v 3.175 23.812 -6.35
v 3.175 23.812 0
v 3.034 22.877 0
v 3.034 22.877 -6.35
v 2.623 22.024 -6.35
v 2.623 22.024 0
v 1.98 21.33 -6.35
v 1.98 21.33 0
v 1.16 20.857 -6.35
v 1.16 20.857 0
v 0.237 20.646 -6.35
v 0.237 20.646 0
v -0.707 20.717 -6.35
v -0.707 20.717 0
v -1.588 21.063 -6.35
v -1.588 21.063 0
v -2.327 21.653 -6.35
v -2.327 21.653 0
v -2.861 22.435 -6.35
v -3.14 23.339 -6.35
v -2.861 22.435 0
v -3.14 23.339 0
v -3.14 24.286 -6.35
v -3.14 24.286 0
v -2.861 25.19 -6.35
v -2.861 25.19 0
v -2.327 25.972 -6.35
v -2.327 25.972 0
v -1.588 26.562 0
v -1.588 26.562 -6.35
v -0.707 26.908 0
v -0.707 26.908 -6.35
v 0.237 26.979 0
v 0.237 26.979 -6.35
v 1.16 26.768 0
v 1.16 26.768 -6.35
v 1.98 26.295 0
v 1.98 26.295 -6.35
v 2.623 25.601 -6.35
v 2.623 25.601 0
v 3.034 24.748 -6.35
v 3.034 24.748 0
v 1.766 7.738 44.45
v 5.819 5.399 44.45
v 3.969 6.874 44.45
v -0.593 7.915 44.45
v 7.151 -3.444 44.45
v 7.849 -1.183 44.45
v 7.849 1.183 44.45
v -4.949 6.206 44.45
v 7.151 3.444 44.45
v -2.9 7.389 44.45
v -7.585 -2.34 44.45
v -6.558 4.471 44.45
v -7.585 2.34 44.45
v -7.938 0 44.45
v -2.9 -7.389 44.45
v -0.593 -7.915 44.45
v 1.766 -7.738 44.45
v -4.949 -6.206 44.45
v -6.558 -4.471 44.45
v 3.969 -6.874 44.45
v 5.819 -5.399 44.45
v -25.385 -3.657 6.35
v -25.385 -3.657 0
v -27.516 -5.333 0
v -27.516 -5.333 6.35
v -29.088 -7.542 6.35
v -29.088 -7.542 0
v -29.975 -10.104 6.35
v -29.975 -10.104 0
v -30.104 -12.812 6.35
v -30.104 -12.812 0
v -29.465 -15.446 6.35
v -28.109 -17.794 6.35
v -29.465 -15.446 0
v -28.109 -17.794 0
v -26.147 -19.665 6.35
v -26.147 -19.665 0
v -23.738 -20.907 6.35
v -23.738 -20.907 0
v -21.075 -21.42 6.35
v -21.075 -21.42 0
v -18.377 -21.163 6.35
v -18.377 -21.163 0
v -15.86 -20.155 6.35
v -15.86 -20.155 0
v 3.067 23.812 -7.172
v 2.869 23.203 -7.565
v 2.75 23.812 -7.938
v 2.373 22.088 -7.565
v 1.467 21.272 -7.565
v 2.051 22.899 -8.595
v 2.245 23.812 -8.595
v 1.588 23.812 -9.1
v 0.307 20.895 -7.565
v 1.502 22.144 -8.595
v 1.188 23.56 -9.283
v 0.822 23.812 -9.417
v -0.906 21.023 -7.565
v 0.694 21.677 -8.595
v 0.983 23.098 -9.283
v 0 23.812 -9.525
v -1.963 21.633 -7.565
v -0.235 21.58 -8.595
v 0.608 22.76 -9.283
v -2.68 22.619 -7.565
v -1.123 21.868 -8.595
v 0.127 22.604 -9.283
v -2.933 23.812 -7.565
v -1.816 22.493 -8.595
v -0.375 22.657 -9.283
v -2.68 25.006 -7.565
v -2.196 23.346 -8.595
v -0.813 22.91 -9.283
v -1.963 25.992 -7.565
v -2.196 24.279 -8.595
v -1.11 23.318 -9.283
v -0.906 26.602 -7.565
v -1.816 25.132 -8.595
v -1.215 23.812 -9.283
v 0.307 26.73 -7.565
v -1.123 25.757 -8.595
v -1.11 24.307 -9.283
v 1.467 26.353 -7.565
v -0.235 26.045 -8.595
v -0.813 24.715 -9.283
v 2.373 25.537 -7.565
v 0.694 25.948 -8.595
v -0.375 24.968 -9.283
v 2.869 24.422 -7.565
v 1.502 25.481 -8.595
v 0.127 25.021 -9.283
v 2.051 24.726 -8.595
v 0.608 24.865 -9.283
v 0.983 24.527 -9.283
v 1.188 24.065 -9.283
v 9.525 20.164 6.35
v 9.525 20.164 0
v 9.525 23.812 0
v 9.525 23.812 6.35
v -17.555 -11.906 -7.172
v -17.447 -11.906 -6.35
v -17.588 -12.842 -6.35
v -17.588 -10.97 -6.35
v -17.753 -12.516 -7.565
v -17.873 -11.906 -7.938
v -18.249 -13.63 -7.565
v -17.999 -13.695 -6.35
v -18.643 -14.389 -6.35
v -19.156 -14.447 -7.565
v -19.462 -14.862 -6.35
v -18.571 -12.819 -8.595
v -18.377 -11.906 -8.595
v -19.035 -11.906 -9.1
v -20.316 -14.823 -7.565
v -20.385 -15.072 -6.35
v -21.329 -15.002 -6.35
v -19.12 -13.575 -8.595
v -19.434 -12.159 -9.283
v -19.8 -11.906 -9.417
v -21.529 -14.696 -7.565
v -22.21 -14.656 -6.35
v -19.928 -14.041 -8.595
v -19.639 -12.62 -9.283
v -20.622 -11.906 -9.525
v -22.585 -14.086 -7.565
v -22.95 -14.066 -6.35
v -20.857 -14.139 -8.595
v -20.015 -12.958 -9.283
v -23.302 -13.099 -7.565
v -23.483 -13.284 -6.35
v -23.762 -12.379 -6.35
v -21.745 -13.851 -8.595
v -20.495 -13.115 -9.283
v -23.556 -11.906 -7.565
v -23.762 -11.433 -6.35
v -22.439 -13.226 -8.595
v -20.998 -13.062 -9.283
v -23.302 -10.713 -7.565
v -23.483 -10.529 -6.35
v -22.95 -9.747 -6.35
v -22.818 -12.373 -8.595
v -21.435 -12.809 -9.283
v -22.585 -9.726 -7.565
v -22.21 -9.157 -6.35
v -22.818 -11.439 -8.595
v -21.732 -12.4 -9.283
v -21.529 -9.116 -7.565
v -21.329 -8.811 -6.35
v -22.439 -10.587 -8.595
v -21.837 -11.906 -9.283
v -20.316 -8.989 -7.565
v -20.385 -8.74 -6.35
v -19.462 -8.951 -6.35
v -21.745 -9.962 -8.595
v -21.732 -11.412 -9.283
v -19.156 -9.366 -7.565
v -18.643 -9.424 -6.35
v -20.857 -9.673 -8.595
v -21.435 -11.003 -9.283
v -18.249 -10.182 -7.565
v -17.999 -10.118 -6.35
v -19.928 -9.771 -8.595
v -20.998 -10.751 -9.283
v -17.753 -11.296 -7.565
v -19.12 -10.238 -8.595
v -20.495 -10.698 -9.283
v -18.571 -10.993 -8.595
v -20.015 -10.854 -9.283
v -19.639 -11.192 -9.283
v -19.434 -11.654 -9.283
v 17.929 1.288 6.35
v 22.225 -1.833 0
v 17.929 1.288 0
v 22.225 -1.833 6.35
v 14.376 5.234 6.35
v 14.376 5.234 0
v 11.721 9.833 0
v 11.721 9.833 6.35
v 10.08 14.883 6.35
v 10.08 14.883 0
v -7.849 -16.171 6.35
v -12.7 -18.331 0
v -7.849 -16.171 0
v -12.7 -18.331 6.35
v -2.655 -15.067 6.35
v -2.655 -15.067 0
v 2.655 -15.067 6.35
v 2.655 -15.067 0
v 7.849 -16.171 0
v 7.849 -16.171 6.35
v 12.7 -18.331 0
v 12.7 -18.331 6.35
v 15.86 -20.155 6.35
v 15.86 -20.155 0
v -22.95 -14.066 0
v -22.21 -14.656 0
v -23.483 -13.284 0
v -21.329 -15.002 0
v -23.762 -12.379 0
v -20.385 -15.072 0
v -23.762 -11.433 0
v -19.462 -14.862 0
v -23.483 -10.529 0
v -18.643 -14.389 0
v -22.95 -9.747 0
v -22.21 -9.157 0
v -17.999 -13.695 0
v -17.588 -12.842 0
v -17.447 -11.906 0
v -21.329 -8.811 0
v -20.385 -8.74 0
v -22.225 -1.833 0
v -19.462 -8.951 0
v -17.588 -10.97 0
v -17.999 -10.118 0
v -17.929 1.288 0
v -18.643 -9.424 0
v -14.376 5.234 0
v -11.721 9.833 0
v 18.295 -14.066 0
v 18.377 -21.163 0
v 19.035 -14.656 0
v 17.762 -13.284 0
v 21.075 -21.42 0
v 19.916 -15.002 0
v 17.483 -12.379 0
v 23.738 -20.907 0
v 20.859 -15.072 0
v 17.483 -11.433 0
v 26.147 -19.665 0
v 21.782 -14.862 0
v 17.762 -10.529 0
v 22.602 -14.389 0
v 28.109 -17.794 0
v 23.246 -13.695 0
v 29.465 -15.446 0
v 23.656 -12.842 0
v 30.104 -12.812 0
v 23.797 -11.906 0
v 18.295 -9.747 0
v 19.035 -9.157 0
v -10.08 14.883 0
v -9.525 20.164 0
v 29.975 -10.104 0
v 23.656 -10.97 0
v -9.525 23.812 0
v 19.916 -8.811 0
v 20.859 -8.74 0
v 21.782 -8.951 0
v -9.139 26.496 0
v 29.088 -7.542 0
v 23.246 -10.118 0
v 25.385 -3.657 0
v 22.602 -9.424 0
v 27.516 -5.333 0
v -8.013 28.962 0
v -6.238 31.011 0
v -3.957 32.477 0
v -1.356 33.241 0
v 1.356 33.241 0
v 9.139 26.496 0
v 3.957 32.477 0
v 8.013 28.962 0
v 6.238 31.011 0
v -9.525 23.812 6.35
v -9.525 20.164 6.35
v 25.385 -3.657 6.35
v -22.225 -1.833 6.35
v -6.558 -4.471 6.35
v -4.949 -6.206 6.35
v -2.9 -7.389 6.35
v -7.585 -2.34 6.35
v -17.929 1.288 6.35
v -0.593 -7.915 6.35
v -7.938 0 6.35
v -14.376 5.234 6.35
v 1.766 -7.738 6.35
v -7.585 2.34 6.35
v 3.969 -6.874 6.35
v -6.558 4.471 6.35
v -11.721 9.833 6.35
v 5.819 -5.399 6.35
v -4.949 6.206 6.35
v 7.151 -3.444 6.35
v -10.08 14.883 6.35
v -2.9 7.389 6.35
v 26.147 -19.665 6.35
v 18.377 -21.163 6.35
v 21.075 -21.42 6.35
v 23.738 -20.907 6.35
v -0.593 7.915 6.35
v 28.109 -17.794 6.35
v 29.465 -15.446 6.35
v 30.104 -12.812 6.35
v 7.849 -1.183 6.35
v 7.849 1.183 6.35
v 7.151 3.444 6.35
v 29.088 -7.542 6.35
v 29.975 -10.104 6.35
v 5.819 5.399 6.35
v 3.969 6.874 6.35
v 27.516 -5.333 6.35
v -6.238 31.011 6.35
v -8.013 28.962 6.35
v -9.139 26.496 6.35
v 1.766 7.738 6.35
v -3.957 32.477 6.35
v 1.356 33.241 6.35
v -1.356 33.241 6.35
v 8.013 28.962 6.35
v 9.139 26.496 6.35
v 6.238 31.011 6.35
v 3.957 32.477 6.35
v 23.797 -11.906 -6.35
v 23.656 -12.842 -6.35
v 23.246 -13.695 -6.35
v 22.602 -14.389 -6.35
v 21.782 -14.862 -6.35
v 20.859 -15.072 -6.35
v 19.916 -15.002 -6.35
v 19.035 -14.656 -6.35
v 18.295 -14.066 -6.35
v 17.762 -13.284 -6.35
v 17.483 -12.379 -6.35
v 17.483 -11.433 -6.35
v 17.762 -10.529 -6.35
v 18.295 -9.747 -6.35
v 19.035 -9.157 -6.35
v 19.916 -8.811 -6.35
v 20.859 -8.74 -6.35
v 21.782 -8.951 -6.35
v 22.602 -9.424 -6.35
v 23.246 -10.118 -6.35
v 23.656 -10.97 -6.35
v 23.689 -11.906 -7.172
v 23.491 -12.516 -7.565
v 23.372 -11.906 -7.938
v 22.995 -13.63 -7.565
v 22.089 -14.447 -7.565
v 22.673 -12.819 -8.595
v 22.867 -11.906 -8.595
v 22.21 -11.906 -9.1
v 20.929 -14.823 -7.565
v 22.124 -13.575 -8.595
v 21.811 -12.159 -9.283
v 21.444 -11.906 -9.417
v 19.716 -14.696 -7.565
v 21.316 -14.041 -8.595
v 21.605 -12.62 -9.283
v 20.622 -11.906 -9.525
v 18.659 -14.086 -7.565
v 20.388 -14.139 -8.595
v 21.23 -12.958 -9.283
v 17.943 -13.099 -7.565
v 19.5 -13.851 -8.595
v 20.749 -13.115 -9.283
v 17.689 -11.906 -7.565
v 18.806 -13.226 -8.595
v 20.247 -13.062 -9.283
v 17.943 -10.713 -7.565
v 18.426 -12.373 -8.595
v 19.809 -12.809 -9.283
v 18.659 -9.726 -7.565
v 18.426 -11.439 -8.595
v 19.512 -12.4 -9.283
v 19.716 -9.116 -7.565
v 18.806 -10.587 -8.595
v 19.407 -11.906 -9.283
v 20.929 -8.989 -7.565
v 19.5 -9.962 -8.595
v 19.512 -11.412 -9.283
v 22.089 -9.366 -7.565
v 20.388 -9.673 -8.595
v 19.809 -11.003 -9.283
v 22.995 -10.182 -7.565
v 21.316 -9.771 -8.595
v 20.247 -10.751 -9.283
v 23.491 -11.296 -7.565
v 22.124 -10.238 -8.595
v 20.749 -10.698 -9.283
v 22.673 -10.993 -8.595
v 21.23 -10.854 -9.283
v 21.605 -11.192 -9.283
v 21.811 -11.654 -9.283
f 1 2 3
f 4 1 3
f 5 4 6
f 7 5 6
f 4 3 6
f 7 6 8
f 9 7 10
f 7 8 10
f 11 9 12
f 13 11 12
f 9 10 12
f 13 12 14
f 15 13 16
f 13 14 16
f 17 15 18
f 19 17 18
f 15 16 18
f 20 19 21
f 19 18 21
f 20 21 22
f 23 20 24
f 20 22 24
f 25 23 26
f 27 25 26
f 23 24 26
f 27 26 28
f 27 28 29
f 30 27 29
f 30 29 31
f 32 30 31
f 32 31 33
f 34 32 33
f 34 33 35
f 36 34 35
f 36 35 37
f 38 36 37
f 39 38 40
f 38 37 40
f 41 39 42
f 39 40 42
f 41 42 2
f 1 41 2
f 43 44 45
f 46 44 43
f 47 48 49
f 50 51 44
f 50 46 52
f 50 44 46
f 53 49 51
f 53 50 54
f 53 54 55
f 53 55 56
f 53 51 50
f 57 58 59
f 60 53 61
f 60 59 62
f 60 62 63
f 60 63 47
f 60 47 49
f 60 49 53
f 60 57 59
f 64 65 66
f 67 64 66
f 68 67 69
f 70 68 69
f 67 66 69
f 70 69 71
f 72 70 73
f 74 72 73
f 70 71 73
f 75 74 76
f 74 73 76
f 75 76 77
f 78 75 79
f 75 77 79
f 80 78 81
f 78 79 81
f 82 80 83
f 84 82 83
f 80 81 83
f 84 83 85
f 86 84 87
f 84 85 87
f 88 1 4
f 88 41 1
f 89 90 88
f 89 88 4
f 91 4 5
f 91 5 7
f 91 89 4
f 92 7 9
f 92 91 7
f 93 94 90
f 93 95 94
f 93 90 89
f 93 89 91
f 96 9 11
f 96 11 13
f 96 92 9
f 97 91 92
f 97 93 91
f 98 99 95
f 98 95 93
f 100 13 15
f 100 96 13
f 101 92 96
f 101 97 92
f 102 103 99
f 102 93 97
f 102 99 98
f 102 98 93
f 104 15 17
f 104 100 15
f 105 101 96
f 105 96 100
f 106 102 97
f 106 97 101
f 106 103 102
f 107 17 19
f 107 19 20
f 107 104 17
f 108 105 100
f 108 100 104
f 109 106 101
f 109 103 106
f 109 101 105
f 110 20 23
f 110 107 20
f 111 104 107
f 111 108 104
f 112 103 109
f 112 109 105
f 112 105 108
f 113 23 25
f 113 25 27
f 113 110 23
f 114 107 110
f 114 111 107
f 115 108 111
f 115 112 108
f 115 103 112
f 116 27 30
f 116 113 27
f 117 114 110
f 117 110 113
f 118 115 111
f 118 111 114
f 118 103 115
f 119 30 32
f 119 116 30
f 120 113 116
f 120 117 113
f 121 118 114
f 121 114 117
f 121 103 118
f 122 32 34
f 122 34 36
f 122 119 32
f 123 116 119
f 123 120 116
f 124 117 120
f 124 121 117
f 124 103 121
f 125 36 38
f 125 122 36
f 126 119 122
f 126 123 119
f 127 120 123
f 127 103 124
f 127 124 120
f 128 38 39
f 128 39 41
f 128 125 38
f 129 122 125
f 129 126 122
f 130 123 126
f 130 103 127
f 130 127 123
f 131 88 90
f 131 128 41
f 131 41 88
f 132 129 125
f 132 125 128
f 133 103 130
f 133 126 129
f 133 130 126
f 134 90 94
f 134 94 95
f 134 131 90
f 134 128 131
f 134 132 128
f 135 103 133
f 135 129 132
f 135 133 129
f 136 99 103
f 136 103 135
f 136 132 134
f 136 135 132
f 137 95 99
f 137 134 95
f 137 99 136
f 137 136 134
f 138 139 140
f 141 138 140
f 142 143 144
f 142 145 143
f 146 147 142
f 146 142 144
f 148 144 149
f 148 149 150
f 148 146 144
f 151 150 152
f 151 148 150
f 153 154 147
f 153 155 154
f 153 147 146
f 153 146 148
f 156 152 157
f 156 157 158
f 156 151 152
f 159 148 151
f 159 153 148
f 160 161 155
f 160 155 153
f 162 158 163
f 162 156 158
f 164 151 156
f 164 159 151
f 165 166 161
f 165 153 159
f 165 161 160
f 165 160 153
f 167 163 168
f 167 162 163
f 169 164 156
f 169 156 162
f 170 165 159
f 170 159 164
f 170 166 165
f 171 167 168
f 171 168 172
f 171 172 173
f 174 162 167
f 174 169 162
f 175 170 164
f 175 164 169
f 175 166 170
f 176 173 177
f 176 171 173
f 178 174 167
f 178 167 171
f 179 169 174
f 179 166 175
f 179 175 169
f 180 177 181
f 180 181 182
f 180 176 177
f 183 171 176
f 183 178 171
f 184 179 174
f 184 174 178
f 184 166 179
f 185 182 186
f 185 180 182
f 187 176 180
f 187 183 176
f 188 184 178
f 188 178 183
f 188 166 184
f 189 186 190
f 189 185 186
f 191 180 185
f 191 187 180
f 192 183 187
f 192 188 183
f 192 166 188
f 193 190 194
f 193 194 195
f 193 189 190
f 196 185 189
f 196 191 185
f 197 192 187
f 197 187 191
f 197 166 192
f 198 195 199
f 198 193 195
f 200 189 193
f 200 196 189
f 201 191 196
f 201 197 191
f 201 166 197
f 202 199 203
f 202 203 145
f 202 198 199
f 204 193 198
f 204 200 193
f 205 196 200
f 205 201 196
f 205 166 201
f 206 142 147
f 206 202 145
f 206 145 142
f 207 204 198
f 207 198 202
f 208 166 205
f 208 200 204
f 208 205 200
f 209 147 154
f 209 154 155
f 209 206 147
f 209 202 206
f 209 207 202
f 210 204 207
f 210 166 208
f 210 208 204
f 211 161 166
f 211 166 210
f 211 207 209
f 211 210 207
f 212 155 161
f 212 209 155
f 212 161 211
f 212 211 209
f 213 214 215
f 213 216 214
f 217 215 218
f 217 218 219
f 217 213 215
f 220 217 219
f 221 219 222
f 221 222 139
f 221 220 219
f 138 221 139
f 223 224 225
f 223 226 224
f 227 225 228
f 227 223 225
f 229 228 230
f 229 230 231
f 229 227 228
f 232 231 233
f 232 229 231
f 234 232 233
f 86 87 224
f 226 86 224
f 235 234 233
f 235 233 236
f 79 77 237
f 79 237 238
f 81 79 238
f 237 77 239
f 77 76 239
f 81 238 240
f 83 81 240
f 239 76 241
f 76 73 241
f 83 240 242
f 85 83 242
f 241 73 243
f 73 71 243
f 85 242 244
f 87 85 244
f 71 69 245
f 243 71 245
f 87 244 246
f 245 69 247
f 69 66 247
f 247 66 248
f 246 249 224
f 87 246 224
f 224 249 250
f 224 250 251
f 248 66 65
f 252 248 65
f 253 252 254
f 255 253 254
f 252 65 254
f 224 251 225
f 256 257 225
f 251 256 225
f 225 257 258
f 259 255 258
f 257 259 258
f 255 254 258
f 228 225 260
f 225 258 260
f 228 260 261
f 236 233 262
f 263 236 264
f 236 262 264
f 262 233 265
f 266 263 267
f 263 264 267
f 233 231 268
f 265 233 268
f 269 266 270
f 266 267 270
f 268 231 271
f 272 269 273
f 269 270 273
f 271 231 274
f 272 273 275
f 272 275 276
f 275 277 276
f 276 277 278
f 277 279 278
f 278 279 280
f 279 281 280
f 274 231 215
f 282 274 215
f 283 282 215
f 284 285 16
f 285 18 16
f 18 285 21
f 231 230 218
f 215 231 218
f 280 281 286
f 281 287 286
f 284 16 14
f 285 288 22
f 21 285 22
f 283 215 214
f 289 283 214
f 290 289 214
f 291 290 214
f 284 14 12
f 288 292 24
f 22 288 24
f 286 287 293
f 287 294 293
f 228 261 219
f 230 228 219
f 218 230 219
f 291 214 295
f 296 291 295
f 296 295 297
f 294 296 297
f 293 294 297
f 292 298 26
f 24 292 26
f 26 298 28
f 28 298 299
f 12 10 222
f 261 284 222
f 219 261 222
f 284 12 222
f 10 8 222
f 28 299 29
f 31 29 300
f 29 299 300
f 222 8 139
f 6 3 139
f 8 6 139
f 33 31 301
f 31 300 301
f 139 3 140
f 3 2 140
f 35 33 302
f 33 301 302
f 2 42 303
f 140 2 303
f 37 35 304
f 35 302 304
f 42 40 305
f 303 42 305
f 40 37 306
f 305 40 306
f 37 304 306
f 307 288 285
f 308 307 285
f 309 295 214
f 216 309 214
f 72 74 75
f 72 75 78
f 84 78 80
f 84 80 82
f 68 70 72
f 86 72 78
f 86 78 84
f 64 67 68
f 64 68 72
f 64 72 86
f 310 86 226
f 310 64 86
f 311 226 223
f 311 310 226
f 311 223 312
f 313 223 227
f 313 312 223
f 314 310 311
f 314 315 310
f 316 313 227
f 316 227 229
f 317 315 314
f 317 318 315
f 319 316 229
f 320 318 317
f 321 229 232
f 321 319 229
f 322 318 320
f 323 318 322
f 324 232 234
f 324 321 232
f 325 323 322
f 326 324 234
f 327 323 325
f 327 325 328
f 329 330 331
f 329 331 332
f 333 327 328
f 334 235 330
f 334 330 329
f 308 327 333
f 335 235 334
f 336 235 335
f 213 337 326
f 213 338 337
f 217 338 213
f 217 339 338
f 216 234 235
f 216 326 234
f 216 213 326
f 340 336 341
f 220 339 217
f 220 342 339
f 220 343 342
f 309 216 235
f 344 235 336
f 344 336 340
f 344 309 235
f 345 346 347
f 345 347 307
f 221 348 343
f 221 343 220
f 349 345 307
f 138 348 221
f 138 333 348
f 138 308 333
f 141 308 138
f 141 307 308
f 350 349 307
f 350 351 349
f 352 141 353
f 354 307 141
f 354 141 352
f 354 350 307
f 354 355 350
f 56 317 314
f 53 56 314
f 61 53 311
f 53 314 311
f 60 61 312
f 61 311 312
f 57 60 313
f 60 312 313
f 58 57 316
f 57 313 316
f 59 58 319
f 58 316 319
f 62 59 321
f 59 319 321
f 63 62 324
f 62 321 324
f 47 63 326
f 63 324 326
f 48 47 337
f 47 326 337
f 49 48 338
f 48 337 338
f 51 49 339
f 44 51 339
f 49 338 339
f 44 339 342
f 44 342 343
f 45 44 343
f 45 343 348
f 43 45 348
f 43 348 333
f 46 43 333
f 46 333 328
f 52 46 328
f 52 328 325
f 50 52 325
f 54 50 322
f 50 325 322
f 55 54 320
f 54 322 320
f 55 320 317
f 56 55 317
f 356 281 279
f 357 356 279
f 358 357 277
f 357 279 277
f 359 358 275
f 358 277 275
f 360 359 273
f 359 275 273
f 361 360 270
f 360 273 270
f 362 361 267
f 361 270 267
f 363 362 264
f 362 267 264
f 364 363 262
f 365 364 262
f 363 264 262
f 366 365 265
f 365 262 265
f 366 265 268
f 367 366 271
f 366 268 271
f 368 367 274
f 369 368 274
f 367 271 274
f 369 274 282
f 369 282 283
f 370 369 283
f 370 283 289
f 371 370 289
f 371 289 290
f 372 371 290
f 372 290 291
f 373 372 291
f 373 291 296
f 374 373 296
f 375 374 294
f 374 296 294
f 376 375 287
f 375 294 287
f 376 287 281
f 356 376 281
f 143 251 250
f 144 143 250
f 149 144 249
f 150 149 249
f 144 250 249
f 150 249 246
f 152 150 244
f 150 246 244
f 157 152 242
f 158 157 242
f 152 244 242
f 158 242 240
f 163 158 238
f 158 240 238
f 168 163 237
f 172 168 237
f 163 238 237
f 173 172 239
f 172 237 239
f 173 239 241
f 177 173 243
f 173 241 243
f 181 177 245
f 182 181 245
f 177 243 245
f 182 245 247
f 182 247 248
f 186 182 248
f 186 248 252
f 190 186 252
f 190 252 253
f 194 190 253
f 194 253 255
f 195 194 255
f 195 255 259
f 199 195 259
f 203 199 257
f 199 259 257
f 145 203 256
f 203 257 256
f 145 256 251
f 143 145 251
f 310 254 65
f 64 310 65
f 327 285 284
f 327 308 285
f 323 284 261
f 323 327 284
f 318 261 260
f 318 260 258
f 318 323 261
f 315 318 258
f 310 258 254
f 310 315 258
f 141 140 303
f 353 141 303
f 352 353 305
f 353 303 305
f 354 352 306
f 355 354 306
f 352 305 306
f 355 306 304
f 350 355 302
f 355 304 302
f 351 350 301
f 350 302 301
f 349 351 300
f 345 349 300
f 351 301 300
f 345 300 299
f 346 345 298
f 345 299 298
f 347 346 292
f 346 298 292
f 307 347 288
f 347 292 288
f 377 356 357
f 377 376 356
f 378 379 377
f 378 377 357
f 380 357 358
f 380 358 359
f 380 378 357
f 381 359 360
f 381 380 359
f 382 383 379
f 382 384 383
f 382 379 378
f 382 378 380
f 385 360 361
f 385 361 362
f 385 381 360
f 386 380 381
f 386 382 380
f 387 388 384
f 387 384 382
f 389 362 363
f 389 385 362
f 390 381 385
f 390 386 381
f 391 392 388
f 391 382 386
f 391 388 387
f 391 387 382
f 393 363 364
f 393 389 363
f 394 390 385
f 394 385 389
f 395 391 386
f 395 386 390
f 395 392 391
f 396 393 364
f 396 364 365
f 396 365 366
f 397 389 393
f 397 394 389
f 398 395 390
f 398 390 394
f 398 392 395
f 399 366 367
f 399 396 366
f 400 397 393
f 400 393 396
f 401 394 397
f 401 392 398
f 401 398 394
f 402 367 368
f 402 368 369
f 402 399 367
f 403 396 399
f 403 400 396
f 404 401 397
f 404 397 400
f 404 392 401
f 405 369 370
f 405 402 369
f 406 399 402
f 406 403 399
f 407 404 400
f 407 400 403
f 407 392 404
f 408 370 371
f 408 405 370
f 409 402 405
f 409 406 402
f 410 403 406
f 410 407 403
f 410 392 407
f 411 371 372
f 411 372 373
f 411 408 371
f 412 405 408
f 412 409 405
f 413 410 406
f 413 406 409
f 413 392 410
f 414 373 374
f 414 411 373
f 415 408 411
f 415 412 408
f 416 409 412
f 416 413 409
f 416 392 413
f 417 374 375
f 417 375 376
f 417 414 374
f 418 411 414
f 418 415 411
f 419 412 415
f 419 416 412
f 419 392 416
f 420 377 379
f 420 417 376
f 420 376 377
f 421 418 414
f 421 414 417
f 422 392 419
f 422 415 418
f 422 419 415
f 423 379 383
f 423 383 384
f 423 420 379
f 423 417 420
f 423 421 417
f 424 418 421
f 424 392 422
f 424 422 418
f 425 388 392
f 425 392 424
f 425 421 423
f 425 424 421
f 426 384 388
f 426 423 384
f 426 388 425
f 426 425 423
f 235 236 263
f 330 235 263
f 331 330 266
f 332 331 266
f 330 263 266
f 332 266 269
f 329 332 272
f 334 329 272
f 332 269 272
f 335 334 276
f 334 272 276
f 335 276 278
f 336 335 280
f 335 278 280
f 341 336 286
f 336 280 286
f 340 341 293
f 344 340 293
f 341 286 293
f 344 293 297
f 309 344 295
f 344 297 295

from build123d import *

# Parameters (mm, degrees)
BOSS_EXTRUDE1_DEPTH = 6.35
FILLET1_R           = 25.4
SKETCH3_R           = 3.175
BOSS_EXTRUDE2_DEPTH = 9.525
FILLET2_R           = 3.175
SKETCH4_R           = 7.9375
BOSS_EXTRUDE3_DEPTH = 38.1


with BuildPart() as part:
    # Sketch2 → Boss-Extrude1 (new body)
    with BuildSketch(Plane.XY):
        with BuildLine():
            Line((-15.859729928, -20.155141971), (0, -10.998522628))
            Line((0, -10.998522628), (15.859729928, -20.155141971))
            ThreePointArc((15.859729928, -20.155141971), (28.871121899, -16.66875), (25.384729928, -3.657358029))
            Line((25.384729928, -3.657358029), (9.525, 5.499261314))
            Line((9.525, 5.499261314), (9.525, 23.8125))
            ThreePointArc((9.525, 23.8125), (0, 33.3375), (-9.525, 23.8125))
            Line((-9.525, 23.8125), (-9.525, 5.499261314))
            Line((-9.525, 5.499261314), (-25.384729928, -3.657358029))
            ThreePointArc((-25.384729928, -3.657358029), (-28.871121899, -16.66875), (-15.859729928, -20.155141971))
        make_face()
    extrude(amount=BOSS_EXTRUDE1_DEPTH)

    # Fillet1
    fillet1_edges = [part.edges().sort_by_distance(p)[0] for p in [
        (-9.525, 5.499261314, 3.175),
        (9.525, 5.499261314, 3.175),
        (0, -10.998522628, 3.175),
    ]]
    fillet(fillet1_edges, radius=FILLET1_R)

    # Sketch3 → Boss-Extrude2 (add)
    with BuildSketch(Plane(origin=(0, 0, 0), x_dir=(-1, 0, 0), z_dir=(0, 0, -1))):
        with Locations(Location((0, 23.8125, 0), (0, 0, 180))):
            Circle(SKETCH3_R)
        with Locations(Location((20.622229928, -11.90625, 0), (0, 0, 180))):
            Circle(SKETCH3_R)
        with Locations(Location((-20.622229928, -11.90625, 0), (0, 0, 180))):
            Circle(SKETCH3_R)
    extrude(amount=BOSS_EXTRUDE2_DEPTH)

    # Fillet2
    fillet2_edges = [part.edges().sort_by_distance(p)[0] for p in [
        (-3.175, 23.8125, -9.525),
        (-23.797229928, -11.90625, -9.525),
        (17.447229928, -11.90625, -9.525),
    ]]
    fillet(fillet2_edges, radius=FILLET2_R)

    # Sketch4 → Boss-Extrude3 (add)
    with BuildSketch(Plane.XY.offset(6.35)):
        with Locations(Location((0, 0, 0), (0, 0, 180))):
            Circle(SKETCH4_R)
    extrude(amount=BOSS_EXTRUDE3_DEPTH)


solid = part.part
